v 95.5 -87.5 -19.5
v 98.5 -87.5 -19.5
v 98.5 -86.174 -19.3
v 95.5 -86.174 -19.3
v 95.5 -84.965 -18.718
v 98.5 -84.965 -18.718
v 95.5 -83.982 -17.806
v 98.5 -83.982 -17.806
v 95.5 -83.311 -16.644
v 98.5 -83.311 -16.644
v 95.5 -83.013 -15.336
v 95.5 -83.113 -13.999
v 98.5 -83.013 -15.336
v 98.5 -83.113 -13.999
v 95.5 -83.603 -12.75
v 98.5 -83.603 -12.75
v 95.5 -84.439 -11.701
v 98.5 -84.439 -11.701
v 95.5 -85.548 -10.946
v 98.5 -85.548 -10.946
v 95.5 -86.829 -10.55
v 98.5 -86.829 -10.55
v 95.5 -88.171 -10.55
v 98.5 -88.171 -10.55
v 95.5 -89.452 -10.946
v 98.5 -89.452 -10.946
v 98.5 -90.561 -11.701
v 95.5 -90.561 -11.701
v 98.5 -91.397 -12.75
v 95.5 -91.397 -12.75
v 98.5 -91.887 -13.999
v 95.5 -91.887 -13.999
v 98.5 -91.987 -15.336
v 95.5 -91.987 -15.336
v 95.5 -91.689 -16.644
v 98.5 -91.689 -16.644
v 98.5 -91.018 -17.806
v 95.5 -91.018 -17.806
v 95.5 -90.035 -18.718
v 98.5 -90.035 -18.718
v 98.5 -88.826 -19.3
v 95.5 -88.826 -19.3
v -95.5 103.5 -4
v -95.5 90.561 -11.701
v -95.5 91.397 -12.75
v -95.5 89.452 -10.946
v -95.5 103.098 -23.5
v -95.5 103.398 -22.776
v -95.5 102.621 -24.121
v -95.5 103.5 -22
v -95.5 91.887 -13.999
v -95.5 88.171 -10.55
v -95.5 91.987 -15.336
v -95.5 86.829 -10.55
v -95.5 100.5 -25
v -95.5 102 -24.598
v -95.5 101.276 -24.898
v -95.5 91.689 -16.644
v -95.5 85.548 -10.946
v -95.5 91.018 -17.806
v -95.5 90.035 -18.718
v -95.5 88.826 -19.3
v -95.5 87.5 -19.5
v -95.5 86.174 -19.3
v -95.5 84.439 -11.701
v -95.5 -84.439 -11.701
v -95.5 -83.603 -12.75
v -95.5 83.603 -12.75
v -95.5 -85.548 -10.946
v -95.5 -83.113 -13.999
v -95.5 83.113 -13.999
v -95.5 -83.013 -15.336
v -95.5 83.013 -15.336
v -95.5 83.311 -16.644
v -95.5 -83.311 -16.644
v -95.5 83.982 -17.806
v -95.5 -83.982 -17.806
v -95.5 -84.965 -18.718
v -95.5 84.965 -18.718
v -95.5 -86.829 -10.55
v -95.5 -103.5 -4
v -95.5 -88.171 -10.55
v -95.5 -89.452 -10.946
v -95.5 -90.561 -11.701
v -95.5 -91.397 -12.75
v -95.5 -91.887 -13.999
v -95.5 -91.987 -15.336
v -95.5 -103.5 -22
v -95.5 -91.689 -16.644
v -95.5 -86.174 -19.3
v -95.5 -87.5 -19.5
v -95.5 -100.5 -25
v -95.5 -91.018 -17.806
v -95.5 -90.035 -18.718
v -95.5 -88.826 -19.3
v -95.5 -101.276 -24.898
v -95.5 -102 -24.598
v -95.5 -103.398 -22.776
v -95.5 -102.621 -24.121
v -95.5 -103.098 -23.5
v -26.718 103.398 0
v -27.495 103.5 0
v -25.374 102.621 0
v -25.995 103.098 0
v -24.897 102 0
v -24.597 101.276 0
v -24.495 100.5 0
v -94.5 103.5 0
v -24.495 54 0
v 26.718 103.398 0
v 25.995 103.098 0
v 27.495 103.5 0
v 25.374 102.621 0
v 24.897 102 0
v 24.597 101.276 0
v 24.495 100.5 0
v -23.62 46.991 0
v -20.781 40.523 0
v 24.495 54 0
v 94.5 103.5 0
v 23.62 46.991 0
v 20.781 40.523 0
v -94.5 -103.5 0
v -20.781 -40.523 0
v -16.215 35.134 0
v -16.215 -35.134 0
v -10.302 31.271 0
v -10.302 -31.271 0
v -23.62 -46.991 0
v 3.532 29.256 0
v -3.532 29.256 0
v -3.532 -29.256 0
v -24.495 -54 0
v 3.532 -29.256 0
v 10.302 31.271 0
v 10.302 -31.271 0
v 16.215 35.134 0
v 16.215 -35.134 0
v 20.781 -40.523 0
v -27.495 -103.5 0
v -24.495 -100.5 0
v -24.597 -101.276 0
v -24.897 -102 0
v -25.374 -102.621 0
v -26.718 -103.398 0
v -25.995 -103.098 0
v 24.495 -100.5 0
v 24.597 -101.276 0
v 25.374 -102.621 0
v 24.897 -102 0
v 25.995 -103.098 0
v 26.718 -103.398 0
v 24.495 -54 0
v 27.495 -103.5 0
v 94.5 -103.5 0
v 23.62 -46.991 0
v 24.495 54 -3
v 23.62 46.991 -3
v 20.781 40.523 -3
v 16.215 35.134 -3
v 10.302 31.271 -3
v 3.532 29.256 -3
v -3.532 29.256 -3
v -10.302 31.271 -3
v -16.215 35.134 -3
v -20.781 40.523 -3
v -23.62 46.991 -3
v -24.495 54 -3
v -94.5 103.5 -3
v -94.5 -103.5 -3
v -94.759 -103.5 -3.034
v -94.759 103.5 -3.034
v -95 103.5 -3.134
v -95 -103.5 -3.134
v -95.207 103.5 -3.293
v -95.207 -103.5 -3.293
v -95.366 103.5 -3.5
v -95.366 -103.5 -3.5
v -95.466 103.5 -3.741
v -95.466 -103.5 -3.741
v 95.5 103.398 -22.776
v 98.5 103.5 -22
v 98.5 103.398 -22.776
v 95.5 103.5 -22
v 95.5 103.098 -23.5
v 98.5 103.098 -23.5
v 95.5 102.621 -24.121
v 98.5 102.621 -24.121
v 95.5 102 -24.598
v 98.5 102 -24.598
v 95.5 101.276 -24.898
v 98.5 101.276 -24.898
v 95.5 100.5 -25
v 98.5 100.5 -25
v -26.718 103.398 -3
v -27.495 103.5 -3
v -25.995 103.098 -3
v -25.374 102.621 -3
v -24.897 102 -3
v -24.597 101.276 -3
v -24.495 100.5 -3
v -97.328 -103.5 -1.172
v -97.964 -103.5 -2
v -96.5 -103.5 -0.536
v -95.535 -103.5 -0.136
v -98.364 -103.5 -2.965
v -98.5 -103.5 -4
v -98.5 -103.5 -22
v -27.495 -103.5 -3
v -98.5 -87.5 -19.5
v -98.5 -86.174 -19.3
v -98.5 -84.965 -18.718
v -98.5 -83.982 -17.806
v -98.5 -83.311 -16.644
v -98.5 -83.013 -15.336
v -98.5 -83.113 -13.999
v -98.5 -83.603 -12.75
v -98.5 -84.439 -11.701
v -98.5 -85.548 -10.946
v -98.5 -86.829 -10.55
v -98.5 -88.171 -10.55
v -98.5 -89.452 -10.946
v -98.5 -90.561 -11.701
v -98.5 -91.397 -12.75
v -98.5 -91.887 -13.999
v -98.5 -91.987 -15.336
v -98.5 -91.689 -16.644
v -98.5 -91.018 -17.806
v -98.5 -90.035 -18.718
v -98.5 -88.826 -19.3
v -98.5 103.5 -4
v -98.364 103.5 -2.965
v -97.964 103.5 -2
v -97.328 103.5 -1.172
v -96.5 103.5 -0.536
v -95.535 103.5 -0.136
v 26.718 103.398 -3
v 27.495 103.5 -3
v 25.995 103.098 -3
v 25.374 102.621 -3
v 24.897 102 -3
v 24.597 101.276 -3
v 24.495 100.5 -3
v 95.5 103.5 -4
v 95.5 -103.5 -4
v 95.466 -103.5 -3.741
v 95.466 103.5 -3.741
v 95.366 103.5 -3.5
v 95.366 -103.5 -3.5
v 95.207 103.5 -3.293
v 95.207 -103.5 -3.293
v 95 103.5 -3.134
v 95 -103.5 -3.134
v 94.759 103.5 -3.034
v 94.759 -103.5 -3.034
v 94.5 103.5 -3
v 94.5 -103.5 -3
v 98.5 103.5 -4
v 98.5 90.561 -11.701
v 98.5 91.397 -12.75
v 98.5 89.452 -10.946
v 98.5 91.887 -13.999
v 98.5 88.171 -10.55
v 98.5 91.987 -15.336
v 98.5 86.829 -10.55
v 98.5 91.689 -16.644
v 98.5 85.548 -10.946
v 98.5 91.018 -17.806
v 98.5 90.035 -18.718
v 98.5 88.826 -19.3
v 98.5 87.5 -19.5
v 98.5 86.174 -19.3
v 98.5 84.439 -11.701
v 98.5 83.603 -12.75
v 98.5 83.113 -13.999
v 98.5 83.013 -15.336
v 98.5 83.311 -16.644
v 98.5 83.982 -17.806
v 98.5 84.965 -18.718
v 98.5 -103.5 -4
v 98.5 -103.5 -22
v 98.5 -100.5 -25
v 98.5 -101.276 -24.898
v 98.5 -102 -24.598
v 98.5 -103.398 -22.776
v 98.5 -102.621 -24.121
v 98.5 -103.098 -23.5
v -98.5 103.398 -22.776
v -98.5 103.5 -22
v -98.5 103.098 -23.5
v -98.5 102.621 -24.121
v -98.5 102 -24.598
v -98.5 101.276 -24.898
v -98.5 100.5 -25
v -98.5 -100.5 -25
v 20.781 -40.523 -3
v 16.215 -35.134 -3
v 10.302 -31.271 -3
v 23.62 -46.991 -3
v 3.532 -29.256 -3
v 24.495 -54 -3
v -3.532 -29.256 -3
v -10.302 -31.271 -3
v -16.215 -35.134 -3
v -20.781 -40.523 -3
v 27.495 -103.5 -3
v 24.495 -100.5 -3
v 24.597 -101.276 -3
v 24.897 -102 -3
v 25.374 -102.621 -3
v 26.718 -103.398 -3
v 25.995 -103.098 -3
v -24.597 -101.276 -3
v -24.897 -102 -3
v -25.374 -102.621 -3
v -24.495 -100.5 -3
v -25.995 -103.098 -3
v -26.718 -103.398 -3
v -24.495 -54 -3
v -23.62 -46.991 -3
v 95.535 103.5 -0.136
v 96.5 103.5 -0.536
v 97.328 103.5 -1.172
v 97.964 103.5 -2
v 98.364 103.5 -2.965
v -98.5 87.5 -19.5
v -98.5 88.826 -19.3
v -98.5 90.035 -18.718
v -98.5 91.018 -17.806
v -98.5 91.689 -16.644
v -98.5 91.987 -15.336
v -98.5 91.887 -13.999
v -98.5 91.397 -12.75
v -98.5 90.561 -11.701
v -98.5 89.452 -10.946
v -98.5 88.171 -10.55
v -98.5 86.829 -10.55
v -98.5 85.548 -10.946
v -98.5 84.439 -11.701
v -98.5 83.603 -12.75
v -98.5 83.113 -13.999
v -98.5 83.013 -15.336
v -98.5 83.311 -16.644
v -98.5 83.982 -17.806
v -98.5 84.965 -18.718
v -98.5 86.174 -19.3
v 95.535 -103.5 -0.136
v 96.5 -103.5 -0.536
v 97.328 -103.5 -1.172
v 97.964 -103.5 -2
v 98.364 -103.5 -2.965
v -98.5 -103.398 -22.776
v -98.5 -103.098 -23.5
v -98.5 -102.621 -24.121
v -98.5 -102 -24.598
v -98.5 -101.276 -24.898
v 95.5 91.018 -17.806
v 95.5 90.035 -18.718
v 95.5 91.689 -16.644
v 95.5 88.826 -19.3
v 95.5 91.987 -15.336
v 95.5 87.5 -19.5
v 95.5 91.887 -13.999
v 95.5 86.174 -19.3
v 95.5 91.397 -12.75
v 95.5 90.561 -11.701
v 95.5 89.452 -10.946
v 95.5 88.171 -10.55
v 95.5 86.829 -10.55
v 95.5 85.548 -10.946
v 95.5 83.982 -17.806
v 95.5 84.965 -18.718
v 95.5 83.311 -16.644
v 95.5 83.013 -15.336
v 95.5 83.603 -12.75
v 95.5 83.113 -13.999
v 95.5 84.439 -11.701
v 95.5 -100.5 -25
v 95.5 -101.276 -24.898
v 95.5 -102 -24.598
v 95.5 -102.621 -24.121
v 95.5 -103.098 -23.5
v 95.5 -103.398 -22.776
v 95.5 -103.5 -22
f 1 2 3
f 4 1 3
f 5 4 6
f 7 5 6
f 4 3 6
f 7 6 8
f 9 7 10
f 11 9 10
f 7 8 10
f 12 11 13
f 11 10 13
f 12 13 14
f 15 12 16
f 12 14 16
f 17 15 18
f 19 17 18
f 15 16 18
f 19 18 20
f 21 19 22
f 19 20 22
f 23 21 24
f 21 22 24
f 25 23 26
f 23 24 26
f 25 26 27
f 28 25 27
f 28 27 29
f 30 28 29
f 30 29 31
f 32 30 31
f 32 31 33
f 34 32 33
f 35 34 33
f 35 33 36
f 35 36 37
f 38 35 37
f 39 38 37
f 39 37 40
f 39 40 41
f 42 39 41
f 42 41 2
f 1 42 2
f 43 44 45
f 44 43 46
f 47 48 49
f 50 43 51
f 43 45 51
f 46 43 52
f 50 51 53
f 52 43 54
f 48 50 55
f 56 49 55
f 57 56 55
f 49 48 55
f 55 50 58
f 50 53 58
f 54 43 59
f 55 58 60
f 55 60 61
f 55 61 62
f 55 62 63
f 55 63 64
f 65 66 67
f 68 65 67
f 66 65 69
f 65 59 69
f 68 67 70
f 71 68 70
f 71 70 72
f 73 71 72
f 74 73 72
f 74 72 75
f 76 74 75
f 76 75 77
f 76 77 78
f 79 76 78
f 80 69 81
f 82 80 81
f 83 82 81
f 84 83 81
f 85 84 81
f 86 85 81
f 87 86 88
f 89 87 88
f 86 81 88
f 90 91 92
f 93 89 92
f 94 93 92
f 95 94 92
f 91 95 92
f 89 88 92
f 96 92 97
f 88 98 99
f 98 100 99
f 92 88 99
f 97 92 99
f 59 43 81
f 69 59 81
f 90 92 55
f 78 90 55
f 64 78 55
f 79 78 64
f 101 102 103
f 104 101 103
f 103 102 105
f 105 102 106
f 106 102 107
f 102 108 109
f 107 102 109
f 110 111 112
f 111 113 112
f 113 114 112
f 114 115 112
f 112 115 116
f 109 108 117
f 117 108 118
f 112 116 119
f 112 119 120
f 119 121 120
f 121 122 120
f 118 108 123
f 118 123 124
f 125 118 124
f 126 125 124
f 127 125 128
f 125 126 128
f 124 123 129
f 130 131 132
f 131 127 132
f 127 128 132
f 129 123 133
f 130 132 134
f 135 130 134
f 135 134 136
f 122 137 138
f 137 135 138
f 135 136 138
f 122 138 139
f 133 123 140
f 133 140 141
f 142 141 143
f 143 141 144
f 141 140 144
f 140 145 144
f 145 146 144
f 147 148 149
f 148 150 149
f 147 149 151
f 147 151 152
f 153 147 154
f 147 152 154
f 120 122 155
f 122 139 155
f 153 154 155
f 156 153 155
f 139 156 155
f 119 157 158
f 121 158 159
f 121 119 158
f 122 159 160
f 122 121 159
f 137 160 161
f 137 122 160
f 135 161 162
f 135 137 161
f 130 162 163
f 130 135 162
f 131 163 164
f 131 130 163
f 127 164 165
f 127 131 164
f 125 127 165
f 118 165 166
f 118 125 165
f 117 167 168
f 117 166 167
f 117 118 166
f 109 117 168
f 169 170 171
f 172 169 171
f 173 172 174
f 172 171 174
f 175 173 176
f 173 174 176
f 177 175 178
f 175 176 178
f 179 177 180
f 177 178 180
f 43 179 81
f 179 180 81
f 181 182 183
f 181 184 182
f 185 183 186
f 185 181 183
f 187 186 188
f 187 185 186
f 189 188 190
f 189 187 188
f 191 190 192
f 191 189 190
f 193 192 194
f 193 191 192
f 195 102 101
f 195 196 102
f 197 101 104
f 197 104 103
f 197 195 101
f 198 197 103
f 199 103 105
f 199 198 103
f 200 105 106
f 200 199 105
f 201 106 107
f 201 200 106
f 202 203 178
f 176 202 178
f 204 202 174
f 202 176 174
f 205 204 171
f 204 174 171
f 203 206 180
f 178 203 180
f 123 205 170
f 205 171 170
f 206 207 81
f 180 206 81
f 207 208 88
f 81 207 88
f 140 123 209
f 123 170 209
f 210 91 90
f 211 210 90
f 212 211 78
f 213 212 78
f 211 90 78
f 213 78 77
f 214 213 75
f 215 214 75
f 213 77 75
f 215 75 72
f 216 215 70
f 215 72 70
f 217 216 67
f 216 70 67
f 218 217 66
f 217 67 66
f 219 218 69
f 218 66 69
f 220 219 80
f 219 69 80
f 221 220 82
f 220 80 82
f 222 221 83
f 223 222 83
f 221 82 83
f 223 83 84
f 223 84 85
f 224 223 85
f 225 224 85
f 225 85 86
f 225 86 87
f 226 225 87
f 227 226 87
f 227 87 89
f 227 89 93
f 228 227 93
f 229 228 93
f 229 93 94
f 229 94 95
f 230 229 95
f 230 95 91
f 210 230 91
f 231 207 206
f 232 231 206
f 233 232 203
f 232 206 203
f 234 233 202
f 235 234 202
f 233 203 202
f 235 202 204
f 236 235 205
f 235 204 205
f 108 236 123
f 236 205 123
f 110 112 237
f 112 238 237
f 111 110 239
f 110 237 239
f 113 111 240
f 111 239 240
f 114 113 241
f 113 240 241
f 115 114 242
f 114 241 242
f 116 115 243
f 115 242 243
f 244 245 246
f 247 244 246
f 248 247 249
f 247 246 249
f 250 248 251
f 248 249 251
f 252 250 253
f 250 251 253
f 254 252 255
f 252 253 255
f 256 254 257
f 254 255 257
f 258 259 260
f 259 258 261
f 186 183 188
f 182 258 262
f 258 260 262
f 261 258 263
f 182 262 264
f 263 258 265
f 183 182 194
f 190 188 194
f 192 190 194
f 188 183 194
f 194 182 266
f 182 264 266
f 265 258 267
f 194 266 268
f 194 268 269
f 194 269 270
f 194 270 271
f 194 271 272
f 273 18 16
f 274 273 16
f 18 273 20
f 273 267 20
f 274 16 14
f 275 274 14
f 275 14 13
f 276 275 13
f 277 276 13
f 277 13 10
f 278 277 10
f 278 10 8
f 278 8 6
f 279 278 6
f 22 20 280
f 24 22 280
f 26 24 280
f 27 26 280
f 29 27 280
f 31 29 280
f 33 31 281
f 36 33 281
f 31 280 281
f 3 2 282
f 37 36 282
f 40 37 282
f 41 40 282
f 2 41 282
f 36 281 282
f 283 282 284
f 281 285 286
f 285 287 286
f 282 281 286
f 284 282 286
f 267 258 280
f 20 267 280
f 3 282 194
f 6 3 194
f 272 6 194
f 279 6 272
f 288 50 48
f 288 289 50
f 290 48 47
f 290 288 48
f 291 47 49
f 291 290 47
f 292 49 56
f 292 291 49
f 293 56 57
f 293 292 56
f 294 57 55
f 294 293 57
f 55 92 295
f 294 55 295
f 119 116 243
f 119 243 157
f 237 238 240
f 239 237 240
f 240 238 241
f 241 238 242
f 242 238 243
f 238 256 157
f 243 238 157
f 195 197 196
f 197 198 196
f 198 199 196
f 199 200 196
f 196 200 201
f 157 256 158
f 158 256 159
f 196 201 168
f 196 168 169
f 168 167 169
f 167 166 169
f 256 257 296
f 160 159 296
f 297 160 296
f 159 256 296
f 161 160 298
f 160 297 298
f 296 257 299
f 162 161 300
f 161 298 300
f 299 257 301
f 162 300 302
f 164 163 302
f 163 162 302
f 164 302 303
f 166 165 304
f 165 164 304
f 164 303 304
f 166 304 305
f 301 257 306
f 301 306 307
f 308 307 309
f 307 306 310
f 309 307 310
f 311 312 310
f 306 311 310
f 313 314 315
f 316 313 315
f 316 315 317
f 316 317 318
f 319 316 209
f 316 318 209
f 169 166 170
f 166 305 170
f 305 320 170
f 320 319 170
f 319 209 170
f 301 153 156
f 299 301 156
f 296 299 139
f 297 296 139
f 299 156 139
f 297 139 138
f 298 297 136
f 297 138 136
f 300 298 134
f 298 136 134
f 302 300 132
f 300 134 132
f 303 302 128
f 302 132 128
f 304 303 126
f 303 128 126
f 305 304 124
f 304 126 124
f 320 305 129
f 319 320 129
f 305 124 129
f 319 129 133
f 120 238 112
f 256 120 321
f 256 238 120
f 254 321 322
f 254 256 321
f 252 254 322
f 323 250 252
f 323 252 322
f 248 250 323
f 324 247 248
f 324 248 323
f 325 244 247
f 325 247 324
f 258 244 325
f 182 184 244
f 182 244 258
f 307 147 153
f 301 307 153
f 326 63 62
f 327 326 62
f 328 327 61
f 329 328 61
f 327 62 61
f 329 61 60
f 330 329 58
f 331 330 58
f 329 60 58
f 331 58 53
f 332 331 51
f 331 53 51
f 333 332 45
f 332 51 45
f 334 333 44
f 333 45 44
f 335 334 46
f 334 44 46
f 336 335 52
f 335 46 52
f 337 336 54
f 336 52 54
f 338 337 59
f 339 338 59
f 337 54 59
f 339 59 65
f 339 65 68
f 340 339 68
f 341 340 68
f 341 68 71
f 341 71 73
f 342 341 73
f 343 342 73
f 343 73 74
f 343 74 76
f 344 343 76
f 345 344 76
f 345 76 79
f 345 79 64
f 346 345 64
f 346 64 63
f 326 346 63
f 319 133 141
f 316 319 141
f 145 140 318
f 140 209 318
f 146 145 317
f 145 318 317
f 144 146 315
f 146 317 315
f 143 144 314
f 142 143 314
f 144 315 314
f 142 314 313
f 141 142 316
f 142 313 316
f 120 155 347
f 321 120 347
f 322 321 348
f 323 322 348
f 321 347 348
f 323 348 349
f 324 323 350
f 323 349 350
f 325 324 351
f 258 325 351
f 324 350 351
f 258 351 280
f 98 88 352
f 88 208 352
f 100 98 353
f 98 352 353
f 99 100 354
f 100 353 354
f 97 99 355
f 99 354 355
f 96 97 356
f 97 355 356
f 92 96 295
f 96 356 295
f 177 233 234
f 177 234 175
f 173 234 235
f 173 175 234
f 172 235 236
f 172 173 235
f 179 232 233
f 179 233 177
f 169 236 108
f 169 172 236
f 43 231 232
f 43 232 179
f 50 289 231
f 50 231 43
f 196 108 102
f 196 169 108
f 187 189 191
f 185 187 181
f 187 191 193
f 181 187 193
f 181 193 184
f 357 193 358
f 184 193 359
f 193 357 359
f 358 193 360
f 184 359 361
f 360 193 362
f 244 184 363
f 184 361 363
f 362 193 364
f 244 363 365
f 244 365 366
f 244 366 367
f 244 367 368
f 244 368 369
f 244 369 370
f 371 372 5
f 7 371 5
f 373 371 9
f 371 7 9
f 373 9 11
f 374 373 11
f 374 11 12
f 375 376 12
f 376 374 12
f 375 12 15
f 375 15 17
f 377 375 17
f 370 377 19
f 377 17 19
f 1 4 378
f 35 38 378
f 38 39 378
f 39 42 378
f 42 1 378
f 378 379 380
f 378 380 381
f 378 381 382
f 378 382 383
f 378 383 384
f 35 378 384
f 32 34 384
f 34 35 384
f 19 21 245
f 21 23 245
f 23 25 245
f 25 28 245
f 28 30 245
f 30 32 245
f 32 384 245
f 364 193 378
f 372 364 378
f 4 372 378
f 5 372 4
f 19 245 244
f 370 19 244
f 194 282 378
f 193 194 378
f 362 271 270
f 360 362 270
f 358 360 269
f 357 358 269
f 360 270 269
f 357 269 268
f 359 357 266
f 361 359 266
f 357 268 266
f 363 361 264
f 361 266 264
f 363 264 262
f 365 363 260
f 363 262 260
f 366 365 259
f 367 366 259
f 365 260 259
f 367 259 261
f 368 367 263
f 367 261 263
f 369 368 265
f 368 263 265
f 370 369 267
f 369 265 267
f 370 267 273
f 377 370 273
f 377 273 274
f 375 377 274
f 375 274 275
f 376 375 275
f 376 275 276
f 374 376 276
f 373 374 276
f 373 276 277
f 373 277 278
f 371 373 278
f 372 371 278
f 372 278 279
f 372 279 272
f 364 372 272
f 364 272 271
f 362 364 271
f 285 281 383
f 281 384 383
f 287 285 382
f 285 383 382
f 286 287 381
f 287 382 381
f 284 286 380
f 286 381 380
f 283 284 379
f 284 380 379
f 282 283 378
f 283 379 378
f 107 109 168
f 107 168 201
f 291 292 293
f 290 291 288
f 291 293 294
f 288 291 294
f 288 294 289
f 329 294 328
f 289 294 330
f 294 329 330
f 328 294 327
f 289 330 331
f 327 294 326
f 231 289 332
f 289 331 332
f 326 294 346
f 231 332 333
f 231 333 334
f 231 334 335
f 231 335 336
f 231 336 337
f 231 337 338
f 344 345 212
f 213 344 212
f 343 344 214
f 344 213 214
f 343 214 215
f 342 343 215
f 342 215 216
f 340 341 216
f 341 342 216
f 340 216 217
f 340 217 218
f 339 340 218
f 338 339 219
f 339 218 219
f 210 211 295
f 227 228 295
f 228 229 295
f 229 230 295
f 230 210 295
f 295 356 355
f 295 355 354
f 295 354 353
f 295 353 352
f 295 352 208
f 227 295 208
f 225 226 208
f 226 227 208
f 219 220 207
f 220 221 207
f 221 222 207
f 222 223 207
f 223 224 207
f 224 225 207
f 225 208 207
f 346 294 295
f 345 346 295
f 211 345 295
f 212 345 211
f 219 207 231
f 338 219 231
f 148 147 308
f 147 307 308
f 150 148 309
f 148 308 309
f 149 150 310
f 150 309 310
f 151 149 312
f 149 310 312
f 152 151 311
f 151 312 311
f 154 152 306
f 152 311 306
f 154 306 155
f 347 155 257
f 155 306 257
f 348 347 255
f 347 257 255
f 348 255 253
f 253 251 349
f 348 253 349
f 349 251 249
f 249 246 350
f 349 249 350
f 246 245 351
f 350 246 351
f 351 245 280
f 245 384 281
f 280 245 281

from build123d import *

# Parameters (mm, degrees)
BASE_FLANGE1_START = -103.5
BASE_FLANGE1_DEPTH = 207
CUT_EXTRUDE1_REACH = 225.934
SKETCH6_R          = 4.5
CUT_EXTRUDE2_REACH = 147.05
FILLET1_R          = 3
FILLET2_R          = 3


# Read off the part's stored shape, not the designer's step: Base-Flange1
with BuildPart() as part:
    # Base-Flange1 outline → Base-Flange1 (new body)
    with BuildSketch(Plane(origin=(0, 0, 0), x_dir=(1, 0, 0), z_dir=(0, 1, 0)).offset(BASE_FLANGE1_START)):
        with BuildLine():
            Line((-95.5, 4), (-95.5, 25))
            Line((-95.5, 25), (-98.5, 25))
            Line((-98.5, 25), (-98.5, 4))
            ThreePointArc((-98.5, 4), (-97.328427125, 1.171572875), (-94.5, 0))
            Line((-94.5, 0), (94.5, 0))
            ThreePointArc((94.5, 0), (97.328427125, 1.171572875), (98.5, 4))
            Line((98.5, 4), (98.5, 25))
            Line((98.5, 25), (95.5, 25))
            Line((95.5, 25), (95.5, 4))
            ThreePointArc((95.5, 4), (95.207106781, 3.292893219), (94.5, 3))
            Line((94.5, 3), (-94.5, 3))
            ThreePointArc((-94.5, 3), (-95.207106781, 3.292893219), (-95.5, 4))
        make_face()
    extrude(amount=BASE_FLANGE1_DEPTH)

    # Cut-Extrude1: up to this face of the body (flat: up to its plane)
    cut_extrude1_end = Plane(part.part.faces().sort_by_distance((-98.5, 0, -14.5))[0])
    # Sketch6 → Cut-Extrude1 (cut, up to the picked face)
    with BuildSketch(Plane(origin=(98.5, 0, 0), x_dir=(0, 0, -1), z_dir=(1, 0, 0)), mode=Mode.PRIVATE) as cut_extrude1_sk1:
        with Locations((15, 87.5)):
            Circle(SKETCH6_R)
    cut_extrude1_tool1 = split(extrude(cut_extrude1_sk1.sketch, amount=-CUT_EXTRUDE1_REACH, mode=Mode.PRIVATE), bisect_by=cut_extrude1_end, keep=Keep.BOTH, mode=Mode.PRIVATE)
    # Sketch6 → Cut-Extrude1 (cut, up to the picked face)
    with BuildSketch(Plane(origin=(98.5, 0, 0), x_dir=(0, 0, -1), z_dir=(1, 0, 0)), mode=Mode.PRIVATE) as cut_extrude1_sk2:
        with Locations((15, -87.5)):
            Circle(SKETCH6_R)
    cut_extrude1_tool2 = split(extrude(cut_extrude1_sk2.sketch, amount=-CUT_EXTRUDE1_REACH, mode=Mode.PRIVATE), bisect_by=cut_extrude1_end, keep=Keep.BOTH, mode=Mode.PRIVATE)
    add(cut_extrude1_tool1.solids().sort_by(Axis((98.5, 87.5, -15), (-1, 0, 0)))[0], mode=Mode.SUBTRACT)
    add(cut_extrude1_tool2.solids().sort_by(Axis((98.5, -87.5, -15), (-1, 0, 0)))[0], mode=Mode.SUBTRACT)

    # Sketch7 → Cut-Extrude2 (cut, up to next)
    with BuildSketch(Plane.XY, mode=Mode.PRIVATE) as cut_extrude2_sk1:
        with BuildLine():
            Line((24.494899552, 103.5), (24.494899552, 53.999895909))
            ThreePointArc((24.494899552, 53.999895909), (0, 29), (-24.494899552, 53.999895909))
            Line((-24.494899552, 53.999895909), (-24.494899552, 103.5))
            Line((-24.494899552, 103.5), (24.494899552, 103.5))
        make_face()
    cut_extrude2_tool1 = extrude(cut_extrude2_sk1.sketch, amount=-CUT_EXTRUDE2_REACH, mode=Mode.PRIVATE) & part.part
    # Sketch7 → Cut-Extrude2 (cut, up to next)
    with BuildSketch(Plane.XY, mode=Mode.PRIVATE) as cut_extrude2_sk2:
        with BuildLine():
            Line((24.494899552, -103.5), (24.494899552, -53.999895909))
            ThreePointArc((24.494899552, -53.999895909), (0, -29), (-24.494899552, -53.999895909))
            Line((-24.494899552, -53.999895909), (-24.494899552, -103.5))
            Line((-24.494899552, -103.5), (24.494899552, -103.5))
        make_face()
    cut_extrude2_tool2 = extrude(cut_extrude2_sk2.sketch, amount=-CUT_EXTRUDE2_REACH, mode=Mode.PRIVATE) & part.part
    add(cut_extrude2_tool1.solids().sort_by_distance((0, 68.661453, 0))[0], mode=Mode.SUBTRACT)
    add(cut_extrude2_tool2.solids().sort_by_distance((0, -68.661453, 0))[0], mode=Mode.SUBTRACT)

    # Fillet1
    fillet1_edges = [part.edges().sort_by_distance(p)[0] for p in [
        (97, -103.5, -25),
        (-97, -103.5, -25),
        (97, 103.5, -25),
        (-97, 103.5, -25),
    ]]
    fillet(fillet1_edges, radius=FILLET1_R)

    # Fillet2
    fillet2_edges = [part.edges().sort_by_distance(p)[0] for p in [
        (-24.494899552, 103.5, -1.5),
        (24.494899552, 103.5, -1.5),
        (24.494899552, -103.5, -1.5),
        (-24.494899552, -103.5, -1.5),
    ]]
    fillet(fillet2_edges, radius=FILLET2_R)


solid = part.part
